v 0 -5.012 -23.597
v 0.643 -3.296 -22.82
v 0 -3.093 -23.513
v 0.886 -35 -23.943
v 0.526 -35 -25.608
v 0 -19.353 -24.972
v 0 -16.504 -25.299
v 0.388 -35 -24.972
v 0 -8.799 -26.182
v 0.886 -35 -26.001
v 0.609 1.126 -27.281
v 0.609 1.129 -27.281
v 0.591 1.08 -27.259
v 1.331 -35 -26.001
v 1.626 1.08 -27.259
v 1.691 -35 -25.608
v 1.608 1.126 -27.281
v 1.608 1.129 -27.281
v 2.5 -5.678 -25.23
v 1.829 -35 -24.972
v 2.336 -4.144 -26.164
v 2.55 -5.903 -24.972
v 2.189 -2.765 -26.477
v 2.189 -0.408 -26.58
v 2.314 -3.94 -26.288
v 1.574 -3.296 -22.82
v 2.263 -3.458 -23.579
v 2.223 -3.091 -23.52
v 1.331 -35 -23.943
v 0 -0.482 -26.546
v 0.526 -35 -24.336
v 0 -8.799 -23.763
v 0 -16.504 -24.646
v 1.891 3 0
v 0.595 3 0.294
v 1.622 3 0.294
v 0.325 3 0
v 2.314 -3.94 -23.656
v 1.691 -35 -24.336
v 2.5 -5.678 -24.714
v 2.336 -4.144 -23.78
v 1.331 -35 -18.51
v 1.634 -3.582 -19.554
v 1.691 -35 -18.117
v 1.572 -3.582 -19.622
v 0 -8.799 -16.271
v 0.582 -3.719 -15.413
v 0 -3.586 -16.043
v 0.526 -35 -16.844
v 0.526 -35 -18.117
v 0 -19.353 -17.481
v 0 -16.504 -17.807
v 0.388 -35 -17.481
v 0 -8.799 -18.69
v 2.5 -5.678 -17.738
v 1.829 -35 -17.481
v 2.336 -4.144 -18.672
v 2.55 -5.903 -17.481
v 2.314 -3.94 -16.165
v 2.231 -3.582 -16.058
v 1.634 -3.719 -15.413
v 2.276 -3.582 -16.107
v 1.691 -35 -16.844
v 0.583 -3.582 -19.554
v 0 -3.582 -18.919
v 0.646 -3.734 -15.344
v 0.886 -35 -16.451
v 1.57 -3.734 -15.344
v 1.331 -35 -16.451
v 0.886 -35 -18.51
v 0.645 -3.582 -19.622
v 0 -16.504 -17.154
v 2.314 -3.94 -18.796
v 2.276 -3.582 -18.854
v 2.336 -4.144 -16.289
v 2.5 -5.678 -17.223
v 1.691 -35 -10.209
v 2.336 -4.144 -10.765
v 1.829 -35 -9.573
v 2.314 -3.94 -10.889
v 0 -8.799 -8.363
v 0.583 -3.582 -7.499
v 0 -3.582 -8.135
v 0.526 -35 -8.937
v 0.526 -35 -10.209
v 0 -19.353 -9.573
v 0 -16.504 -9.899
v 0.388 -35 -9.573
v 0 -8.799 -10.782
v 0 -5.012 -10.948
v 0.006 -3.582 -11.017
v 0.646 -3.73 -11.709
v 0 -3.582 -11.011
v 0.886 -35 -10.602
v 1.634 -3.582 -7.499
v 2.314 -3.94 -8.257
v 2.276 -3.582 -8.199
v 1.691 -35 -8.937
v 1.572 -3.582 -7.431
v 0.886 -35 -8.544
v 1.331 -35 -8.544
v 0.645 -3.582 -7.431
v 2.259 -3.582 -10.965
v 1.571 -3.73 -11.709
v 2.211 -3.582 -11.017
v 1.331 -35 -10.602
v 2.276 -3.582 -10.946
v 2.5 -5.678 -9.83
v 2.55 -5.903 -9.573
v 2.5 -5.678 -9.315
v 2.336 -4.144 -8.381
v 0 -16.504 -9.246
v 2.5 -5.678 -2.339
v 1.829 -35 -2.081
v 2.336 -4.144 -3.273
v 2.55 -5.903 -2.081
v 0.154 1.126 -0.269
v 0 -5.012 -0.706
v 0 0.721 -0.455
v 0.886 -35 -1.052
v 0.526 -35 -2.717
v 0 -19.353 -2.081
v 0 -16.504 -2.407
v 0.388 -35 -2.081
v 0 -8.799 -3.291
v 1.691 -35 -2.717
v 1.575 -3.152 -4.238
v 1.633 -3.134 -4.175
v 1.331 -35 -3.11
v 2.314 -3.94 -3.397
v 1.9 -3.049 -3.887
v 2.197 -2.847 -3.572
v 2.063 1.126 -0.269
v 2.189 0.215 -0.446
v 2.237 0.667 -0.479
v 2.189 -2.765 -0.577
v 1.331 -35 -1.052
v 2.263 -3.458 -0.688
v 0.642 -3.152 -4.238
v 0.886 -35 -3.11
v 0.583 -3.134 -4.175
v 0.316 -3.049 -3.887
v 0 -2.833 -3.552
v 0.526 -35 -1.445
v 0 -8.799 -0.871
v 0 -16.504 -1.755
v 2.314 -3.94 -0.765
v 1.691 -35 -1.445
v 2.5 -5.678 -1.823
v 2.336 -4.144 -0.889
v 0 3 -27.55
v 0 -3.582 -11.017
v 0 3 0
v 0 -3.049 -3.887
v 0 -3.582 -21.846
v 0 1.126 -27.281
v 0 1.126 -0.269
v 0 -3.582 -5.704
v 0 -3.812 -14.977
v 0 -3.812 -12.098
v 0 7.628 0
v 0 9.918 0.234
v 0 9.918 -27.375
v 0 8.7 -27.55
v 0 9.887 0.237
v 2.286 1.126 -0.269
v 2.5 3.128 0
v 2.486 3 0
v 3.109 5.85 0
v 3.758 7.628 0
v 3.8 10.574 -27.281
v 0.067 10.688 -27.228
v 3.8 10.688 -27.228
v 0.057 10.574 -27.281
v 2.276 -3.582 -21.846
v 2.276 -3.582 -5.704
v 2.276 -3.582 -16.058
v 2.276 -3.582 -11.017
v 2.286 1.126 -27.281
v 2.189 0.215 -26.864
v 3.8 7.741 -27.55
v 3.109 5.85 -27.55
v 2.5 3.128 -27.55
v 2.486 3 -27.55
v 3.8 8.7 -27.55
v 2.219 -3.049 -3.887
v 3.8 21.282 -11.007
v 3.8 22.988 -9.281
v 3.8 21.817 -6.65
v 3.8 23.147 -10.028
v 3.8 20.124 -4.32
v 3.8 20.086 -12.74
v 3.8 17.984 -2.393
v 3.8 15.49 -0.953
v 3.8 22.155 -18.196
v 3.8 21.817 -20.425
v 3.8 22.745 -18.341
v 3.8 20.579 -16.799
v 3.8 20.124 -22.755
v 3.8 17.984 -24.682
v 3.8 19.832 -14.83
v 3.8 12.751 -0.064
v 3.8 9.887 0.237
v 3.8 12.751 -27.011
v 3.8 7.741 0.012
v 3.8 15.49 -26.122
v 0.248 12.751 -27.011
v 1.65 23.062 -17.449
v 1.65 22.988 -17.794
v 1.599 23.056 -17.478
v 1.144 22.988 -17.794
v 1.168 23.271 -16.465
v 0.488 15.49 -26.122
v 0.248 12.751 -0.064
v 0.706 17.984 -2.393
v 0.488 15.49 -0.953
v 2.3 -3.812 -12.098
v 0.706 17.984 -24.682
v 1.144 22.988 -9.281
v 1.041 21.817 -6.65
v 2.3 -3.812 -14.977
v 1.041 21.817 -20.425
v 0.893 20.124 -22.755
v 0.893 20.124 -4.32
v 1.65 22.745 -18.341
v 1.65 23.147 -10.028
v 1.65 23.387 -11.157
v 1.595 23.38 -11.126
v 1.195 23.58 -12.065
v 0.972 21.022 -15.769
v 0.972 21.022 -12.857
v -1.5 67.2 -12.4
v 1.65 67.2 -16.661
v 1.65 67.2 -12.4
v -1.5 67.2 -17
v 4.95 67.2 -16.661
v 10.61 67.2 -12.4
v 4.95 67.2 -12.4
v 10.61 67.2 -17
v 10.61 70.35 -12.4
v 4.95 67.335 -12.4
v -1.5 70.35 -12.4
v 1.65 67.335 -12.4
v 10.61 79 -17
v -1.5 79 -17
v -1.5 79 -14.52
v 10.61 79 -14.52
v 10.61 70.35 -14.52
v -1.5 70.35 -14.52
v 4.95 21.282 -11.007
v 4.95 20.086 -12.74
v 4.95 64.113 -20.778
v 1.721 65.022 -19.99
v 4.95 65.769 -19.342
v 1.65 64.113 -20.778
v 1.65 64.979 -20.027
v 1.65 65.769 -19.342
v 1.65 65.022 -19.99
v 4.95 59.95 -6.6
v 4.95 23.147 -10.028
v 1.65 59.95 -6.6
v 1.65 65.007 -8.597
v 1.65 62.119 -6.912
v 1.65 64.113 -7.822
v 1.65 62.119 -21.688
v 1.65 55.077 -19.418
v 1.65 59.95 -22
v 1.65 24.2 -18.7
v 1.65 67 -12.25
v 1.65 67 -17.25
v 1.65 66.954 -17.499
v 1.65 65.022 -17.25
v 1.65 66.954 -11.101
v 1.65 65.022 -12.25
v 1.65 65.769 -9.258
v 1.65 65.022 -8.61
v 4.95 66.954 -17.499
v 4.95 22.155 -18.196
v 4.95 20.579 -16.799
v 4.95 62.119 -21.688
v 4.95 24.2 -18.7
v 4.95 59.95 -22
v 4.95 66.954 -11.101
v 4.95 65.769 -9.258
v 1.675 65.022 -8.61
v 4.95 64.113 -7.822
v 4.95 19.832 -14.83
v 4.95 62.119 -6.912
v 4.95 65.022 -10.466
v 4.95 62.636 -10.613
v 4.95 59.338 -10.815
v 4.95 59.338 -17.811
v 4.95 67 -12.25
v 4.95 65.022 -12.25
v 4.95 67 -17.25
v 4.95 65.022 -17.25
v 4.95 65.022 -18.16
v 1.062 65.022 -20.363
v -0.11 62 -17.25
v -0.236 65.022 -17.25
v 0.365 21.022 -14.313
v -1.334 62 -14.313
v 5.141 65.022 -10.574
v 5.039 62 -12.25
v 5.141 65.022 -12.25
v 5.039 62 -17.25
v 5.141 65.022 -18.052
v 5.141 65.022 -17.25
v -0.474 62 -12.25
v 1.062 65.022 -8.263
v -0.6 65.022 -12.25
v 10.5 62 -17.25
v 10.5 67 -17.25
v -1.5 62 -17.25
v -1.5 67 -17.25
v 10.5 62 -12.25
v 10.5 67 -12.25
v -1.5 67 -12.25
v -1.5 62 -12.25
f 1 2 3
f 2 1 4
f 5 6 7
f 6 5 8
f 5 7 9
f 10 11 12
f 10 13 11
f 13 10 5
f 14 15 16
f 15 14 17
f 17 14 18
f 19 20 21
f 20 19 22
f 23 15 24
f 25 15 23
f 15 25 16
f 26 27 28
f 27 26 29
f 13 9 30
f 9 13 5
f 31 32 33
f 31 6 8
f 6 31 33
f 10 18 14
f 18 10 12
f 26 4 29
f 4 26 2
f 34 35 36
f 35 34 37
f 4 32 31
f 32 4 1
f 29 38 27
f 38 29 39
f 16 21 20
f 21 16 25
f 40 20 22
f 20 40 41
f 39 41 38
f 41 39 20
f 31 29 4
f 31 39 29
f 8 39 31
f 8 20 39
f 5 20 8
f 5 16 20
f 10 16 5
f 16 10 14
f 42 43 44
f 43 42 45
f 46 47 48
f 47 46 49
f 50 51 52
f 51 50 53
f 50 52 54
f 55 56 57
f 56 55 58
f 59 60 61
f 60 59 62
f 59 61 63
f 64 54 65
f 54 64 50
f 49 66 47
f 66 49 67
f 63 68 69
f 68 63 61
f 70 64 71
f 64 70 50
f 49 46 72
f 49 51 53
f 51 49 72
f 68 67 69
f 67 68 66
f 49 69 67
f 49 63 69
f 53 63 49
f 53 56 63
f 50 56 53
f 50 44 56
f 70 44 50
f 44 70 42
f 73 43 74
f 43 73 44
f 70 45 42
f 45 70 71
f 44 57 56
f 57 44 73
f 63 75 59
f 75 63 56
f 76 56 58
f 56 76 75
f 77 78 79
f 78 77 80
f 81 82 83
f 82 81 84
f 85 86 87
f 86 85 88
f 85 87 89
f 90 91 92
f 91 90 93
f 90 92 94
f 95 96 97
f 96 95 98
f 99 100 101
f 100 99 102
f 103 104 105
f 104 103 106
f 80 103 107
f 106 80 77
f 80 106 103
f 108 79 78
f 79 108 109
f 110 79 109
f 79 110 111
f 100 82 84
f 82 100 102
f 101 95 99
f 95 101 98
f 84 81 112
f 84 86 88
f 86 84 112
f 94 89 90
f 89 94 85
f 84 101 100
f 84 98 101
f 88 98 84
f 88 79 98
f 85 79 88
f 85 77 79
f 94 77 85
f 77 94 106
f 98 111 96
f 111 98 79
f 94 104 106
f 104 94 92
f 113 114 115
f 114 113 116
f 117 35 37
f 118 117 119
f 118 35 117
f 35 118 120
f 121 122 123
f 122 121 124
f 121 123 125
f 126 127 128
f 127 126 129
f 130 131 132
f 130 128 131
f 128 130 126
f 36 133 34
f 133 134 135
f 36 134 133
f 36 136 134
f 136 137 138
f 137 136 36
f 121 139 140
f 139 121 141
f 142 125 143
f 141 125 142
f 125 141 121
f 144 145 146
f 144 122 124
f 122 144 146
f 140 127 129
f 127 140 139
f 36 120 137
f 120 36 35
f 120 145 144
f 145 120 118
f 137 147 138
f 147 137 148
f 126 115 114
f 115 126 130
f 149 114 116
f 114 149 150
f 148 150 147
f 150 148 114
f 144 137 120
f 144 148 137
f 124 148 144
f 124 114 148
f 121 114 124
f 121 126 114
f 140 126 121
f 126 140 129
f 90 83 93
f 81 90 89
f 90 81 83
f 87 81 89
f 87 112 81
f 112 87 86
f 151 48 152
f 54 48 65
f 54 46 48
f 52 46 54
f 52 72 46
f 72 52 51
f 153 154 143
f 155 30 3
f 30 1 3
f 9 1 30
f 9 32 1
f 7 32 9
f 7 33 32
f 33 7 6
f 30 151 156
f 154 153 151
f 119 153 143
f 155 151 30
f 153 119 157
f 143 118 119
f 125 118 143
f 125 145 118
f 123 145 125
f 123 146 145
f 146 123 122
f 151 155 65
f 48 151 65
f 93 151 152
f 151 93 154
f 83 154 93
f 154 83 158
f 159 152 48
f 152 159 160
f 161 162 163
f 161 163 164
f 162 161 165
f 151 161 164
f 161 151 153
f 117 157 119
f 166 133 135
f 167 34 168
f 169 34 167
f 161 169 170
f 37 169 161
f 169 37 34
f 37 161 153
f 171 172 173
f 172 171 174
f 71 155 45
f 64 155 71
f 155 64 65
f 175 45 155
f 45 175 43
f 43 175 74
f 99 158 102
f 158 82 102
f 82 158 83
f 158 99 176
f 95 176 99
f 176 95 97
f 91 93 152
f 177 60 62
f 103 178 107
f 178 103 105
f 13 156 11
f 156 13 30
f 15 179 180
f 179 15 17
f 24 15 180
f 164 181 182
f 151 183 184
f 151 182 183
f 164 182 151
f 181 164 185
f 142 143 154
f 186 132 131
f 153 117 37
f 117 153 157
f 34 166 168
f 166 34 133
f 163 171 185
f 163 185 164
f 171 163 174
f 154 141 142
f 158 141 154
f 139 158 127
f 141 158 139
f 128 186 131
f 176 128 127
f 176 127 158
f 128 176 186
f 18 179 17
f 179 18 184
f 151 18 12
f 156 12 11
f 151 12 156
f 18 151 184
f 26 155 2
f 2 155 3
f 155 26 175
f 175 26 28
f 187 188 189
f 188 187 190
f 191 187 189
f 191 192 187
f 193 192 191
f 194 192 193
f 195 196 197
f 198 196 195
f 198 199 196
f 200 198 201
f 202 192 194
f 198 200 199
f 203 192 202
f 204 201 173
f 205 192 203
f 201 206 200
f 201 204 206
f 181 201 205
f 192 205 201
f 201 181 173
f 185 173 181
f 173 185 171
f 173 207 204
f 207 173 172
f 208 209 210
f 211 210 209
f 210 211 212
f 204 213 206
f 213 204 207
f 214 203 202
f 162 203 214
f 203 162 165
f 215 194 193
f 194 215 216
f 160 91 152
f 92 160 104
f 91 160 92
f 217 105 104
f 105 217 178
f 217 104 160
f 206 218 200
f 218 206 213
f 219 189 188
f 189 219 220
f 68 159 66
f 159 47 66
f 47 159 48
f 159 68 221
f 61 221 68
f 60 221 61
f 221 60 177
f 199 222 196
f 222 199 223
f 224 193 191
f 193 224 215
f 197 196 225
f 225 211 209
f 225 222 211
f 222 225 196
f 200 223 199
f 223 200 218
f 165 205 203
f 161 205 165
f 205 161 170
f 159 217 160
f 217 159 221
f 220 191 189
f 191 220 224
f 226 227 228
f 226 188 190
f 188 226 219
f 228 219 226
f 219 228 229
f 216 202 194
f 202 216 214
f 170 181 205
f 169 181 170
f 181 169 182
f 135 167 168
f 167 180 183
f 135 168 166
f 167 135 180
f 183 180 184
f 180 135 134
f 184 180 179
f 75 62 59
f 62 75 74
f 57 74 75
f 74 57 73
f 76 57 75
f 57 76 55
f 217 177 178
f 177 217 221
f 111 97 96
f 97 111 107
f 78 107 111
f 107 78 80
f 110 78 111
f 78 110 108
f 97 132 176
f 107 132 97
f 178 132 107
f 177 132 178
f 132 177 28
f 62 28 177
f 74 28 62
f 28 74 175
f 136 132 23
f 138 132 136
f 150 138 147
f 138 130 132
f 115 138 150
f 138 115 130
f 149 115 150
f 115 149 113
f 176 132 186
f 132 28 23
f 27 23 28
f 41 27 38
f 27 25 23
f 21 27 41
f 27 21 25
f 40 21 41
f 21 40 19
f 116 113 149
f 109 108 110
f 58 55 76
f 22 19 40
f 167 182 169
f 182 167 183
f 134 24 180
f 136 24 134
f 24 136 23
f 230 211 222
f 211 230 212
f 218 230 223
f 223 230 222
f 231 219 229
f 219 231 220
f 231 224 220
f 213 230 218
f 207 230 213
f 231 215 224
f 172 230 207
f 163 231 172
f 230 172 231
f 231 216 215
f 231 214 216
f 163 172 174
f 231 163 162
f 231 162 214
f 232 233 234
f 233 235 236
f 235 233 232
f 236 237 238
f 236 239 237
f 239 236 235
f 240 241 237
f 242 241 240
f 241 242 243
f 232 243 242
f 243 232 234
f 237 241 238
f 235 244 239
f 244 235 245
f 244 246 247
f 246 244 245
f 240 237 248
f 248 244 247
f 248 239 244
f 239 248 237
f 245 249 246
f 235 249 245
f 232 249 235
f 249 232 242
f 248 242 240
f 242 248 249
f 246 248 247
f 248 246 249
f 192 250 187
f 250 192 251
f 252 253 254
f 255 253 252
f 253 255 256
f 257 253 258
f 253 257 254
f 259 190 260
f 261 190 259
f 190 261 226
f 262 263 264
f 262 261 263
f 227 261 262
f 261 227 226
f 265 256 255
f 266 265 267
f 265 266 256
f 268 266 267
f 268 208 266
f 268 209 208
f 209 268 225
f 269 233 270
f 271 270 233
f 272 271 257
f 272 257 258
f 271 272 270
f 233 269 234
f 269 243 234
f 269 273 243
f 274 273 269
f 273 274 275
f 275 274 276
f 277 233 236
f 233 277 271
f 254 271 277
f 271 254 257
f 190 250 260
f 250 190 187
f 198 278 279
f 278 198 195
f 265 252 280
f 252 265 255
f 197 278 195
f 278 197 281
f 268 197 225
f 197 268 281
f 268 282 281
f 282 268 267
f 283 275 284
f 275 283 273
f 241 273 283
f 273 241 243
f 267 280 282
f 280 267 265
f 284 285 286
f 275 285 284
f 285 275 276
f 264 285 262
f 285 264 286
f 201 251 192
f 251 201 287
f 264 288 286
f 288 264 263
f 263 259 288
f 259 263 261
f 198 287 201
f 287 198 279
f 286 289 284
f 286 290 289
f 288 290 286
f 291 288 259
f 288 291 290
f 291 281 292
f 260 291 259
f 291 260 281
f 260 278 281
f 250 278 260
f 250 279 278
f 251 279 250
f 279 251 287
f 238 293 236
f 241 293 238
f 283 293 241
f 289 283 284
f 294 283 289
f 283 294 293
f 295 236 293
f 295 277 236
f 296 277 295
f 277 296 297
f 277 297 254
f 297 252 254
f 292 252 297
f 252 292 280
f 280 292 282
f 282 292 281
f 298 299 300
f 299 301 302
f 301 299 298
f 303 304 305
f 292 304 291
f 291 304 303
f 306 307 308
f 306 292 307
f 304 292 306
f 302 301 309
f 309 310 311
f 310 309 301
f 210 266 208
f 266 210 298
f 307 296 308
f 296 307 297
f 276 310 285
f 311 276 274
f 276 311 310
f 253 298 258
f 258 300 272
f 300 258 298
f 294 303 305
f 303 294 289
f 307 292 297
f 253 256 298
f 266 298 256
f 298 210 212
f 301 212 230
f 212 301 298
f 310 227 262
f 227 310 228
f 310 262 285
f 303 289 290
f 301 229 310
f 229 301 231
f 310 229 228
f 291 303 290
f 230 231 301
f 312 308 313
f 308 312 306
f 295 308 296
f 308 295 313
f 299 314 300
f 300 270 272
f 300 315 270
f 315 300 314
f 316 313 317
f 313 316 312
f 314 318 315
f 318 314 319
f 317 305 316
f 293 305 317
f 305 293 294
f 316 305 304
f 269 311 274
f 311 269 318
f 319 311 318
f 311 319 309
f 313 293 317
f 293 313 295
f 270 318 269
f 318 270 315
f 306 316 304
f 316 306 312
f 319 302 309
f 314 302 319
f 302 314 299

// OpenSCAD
module all(){


translate([0,3,0])scale(.95)

difference(){

tines(); 

resize(newsize=[35,30,15])
translate([-.5,-3,13])
rotate([90,0,90])
cylinder(35,10,10);

translate([-3,7.5,-5])
rotate([5,0,0])
cube([40,30,5]);

translate([0,-40,5])
cube([40,40,3]);
translate([0,-40,-3])
cube([40,40,3]);}




module tines(){

resize(newsize=[5,40,3.5])
translate([30,0,2])
rotate([90,90,0])
cylinder(25,3,1.3);

resize(newsize=[5,40,3.5])
translate([21,0,2])
rotate([90,90,0])
cylinder(25,3,1.3);

resize(newsize=[5,40,3.5])
translate([11.5,0,2])
rotate([90,90,0])
cylinder(25,3,1.3);

resize(newsize=[5,40,3.5])
translate([2.5,0,2])
rotate([90,90,0])
cylinder(25,3,1.3);

translate([7,0,0])minkowski()
{
 cube([15,6,2]);
 cylinder(r=7,h=2);
};

translate([14.25,7.25,0])cylinder(4,14.5,14.5);}

scale(1.1)translate([13,4.5,1.5])linear_extrude(height=3)hull(){translate([0,17.5,0])circle(4); translate([0,50,0])circle(7);}

scale(1.1)resize(newsize=[11,40,6])translate([11.25,66.5,3])rotate([0,90,270])cylinder(45,5,2.5,$fn=5);
 translate([17,79,-1.5])rotate([90,0,2790])usb();

translate([12.25,62,-1.5])
cube ([5,5,12]);


module usb(){

difference(){

cube ([11.8,12.11,4.6]);

translate([0,0,2.48])
cube([8.65,12.11,2.12]);

}}

}

rotate([0,90,0])
all();
